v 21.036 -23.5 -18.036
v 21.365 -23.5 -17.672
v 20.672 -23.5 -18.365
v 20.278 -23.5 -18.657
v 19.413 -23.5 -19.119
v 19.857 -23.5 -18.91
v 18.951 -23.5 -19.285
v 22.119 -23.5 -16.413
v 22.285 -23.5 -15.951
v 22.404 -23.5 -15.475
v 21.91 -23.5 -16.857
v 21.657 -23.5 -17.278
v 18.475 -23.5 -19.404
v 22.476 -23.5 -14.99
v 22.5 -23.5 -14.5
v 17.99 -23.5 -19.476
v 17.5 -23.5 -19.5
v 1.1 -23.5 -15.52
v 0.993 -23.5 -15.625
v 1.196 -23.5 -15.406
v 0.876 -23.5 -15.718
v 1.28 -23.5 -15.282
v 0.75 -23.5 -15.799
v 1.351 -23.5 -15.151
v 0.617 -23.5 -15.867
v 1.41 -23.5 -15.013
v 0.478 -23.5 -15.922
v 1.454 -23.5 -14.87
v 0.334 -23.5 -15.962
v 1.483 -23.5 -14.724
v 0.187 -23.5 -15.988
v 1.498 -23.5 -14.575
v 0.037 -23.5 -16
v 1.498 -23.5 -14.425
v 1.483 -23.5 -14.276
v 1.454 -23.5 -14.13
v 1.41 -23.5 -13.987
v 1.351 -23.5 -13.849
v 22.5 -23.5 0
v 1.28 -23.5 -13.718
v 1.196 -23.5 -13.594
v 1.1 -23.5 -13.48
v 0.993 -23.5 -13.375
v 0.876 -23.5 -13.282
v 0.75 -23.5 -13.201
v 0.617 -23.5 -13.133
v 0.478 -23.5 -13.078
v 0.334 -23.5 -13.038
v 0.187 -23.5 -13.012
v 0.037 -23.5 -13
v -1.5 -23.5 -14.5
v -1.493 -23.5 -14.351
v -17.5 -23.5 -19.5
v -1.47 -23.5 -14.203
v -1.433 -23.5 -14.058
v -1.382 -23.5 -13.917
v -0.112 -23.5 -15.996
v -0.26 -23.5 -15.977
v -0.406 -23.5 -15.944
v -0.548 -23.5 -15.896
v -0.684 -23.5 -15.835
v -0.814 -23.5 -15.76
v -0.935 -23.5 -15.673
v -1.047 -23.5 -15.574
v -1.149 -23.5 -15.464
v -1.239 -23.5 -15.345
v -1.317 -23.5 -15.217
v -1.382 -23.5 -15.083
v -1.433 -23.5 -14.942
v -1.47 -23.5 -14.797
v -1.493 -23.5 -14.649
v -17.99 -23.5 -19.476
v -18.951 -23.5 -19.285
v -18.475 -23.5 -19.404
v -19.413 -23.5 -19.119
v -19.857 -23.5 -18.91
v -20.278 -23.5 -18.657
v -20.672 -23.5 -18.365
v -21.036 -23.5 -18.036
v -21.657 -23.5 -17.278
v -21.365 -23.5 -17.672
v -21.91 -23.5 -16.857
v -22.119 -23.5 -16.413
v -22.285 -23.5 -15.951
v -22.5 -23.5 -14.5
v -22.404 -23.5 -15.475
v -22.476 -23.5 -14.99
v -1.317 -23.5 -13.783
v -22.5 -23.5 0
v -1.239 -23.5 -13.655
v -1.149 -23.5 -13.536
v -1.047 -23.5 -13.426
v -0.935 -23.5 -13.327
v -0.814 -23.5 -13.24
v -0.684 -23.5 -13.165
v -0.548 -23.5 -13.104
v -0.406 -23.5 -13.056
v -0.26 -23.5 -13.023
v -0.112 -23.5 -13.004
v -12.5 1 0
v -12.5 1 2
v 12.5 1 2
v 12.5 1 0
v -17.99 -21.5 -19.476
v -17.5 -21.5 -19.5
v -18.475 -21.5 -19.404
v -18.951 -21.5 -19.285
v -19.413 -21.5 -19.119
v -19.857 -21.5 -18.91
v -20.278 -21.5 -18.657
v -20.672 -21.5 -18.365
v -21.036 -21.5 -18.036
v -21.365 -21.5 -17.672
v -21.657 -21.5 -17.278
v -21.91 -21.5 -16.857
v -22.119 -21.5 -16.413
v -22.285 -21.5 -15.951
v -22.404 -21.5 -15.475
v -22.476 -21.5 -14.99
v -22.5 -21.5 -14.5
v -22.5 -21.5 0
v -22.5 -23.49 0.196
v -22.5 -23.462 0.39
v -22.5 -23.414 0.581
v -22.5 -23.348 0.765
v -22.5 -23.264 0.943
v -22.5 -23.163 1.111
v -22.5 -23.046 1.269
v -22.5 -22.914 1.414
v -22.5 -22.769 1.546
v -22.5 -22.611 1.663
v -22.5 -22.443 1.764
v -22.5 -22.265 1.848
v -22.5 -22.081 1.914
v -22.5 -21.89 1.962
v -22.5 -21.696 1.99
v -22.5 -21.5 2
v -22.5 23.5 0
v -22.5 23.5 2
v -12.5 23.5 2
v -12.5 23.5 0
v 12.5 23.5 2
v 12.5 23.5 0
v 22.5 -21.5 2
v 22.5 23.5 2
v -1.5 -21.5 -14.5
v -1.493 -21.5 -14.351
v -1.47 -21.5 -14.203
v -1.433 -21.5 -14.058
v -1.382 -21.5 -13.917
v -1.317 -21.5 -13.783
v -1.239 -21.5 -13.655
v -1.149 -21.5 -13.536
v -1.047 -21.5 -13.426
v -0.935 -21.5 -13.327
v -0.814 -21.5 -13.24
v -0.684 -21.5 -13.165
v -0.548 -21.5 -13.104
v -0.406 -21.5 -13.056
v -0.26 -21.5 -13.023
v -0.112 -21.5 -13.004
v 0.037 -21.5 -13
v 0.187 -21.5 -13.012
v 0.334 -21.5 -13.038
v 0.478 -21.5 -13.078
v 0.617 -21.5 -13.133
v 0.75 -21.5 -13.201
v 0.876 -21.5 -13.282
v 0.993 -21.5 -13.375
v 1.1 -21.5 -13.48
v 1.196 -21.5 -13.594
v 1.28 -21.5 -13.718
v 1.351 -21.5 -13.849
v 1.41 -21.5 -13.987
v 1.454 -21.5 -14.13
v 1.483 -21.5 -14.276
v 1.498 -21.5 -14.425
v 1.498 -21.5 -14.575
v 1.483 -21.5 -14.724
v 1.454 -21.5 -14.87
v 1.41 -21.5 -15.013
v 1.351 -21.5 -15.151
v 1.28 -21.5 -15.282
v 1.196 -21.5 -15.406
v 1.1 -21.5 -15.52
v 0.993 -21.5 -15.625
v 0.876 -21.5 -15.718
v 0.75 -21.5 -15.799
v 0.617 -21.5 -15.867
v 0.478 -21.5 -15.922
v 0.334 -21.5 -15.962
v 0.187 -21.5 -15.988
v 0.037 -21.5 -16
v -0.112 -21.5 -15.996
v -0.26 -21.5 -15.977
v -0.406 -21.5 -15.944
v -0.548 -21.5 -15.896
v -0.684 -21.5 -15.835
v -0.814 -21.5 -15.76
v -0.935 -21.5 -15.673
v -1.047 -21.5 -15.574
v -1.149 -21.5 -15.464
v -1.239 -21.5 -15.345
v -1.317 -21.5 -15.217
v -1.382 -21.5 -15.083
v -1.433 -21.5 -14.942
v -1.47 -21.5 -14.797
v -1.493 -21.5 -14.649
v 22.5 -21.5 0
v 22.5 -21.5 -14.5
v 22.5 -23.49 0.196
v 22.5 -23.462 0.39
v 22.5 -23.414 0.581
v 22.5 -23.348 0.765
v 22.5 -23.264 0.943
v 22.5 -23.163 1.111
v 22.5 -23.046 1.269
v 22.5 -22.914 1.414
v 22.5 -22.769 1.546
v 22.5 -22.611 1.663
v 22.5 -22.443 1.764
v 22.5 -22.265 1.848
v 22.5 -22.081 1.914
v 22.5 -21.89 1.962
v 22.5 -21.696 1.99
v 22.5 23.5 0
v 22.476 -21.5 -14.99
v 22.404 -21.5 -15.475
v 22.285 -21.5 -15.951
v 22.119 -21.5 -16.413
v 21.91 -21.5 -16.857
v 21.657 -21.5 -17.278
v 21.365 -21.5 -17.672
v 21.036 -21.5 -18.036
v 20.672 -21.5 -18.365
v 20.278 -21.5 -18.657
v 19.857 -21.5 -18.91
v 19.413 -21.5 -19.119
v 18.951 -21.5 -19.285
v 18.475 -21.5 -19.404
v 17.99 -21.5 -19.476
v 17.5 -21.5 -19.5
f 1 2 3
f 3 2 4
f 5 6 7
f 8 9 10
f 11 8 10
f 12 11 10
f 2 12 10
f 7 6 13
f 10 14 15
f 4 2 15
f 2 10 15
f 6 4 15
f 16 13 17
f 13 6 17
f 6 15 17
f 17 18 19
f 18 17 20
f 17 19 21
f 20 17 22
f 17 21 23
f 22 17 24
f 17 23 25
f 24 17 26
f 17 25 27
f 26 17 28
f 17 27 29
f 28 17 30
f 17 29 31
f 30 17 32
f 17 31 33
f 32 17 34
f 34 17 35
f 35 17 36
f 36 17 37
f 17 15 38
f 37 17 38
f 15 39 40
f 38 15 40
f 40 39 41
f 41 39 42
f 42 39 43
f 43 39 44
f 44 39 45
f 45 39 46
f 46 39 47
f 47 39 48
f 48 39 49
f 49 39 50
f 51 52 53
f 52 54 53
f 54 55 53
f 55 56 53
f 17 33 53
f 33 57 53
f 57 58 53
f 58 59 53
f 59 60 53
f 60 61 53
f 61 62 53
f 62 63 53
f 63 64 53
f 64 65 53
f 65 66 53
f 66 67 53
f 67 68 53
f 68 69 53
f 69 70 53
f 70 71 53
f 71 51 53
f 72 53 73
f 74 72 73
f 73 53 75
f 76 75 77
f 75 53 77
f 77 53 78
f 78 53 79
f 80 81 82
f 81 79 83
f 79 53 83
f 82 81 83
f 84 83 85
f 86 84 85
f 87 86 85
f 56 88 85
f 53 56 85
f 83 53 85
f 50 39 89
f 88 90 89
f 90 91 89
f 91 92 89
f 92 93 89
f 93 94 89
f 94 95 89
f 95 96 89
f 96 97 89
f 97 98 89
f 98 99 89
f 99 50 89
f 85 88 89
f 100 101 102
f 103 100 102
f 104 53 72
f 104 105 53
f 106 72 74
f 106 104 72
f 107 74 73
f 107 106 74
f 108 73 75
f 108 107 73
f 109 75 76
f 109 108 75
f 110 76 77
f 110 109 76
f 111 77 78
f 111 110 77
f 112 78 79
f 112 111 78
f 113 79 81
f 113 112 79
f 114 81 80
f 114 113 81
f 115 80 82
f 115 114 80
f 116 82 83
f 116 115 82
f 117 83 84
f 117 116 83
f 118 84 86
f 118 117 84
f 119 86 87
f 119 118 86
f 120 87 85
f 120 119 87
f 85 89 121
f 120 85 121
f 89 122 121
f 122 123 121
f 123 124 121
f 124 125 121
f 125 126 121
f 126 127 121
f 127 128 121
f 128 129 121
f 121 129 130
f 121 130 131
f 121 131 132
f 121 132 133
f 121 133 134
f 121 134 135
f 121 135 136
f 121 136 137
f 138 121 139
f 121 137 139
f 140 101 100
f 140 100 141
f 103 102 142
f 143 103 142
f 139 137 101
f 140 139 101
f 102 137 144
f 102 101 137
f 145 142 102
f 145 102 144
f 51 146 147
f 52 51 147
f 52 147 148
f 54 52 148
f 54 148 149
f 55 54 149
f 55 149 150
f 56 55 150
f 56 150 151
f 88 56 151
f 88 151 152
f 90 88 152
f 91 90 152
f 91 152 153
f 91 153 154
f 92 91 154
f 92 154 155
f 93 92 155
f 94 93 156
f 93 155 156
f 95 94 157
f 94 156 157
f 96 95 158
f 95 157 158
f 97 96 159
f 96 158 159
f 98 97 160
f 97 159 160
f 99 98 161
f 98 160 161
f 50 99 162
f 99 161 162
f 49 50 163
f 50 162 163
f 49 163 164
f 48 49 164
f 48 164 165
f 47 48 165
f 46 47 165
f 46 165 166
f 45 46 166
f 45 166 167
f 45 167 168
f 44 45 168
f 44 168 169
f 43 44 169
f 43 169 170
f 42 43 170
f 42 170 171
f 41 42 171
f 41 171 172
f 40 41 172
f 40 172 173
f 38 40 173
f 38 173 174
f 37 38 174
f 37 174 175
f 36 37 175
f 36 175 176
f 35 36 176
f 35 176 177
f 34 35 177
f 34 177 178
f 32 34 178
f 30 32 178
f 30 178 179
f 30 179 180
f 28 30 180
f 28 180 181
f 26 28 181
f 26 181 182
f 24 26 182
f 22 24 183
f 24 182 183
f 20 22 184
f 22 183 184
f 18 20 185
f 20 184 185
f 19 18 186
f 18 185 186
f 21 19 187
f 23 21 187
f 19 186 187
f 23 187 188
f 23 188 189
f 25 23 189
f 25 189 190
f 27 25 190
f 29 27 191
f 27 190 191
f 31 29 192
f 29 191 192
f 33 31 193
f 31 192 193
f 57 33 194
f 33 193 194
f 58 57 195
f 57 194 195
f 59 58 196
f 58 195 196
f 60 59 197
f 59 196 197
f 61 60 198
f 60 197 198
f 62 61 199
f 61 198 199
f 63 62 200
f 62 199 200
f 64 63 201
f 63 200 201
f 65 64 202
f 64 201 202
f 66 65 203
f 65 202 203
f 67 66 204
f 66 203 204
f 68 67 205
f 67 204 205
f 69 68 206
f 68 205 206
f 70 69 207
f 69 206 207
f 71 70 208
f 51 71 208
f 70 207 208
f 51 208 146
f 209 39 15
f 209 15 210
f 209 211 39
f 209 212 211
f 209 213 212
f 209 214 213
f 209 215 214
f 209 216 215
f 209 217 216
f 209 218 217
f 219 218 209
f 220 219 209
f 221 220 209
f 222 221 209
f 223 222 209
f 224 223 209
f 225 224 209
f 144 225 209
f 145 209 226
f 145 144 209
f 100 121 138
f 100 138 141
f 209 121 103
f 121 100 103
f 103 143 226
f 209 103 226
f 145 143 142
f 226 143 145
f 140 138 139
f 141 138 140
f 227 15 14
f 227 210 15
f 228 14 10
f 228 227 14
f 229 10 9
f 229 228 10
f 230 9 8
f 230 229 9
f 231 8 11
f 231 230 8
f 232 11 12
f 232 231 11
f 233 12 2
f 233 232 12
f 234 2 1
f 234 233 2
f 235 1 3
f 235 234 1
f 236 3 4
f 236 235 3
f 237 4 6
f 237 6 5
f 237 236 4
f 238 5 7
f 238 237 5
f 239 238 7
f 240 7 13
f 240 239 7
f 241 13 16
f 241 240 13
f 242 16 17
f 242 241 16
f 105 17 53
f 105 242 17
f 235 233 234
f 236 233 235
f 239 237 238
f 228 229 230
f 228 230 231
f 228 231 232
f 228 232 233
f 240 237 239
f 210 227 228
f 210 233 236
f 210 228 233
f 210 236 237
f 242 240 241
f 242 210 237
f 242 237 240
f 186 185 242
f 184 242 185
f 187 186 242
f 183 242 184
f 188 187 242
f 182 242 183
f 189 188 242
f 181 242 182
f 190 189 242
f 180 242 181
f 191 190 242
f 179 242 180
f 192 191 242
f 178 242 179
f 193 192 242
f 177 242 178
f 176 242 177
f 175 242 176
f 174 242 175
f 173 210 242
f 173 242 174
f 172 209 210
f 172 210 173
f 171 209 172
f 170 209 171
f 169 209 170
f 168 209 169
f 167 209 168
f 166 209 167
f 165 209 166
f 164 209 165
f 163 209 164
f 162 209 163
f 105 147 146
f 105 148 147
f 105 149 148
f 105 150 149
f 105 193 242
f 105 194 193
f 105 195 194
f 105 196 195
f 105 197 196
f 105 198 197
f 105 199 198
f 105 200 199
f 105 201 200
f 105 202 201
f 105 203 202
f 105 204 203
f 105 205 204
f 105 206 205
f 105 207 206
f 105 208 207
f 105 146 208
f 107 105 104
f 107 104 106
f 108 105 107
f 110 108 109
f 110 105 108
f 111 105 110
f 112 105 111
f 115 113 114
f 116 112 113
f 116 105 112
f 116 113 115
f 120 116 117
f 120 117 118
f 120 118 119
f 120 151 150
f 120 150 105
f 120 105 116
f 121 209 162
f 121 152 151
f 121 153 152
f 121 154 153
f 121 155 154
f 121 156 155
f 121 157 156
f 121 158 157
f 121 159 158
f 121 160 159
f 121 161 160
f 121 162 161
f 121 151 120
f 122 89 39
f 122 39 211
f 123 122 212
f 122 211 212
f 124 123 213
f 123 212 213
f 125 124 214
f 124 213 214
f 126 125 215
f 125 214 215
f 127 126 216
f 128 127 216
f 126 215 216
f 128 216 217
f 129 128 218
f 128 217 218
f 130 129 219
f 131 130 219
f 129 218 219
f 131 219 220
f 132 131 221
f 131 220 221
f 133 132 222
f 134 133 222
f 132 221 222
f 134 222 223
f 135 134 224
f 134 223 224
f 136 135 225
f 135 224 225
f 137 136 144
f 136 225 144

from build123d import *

# Parameters (mm, degrees)
SKETCH1_W           = 45
SKETCH1_H           = 47
BOSS_EXTRUDE1_DEPTH = 2
SKETCH2_W           = 45
SKETCH2_H           = 2
BOSS_EXTRUDE2_DEPTH = 19.5
FILLET1_R           = 2
FILLET2_R           = 5
SKETCH3_W           = 25
SKETCH3_H           = 22.5
CUT_EXTRUDE1_DEPTH  = 39.99679474
SKETCH4_R           = 1.5
CUT_EXTRUDE2_DEPTH  = 54.958317246


with BuildPart() as part:
    # Sketch1 → Boss-Extrude1 (new body)
    with BuildSketch(Plane.XY):
        Rectangle(SKETCH1_W, SKETCH1_H)
    extrude(amount=BOSS_EXTRUDE1_DEPTH)

    # Sketch2 → Boss-Extrude2 (add)
    with BuildSketch(Plane(origin=(0, 0, 0), x_dir=(-1, 0, 0), z_dir=(0, 0, -1))):
        with Locations((0, -22.5)):
            Rectangle(SKETCH2_W, SKETCH2_H)
    extrude(amount=BOSS_EXTRUDE2_DEPTH)

    # Fillet1
    fillet1_edges = [part.edges().sort_by_distance(p)[0] for p in [
        (0, -23.5, 2),
    ]]
    fillet(fillet1_edges, radius=FILLET1_R)

    # Fillet2
    fillet2_edges = [part.edges().sort_by_distance(p)[0] for p in [
        (22.5, -22.5, -19.5),
        (-22.5, -22.5, -19.5),
    ]]
    fillet(fillet2_edges, radius=FILLET2_R)

    # Sketch3 → Cut-Extrude1 (cut, through all)
    with BuildSketch(Plane.XY.offset(2)):
        with Locations((0, 12.25)):
            Rectangle(SKETCH3_W, SKETCH3_H)
    extrude(amount=-CUT_EXTRUDE1_DEPTH, mode=Mode.SUBTRACT)

    # Sketch4 → Cut-Extrude2 (cut, through all)
    with BuildSketch(Plane(origin=(0, -21.5, 0), x_dir=(1, 0, 0), z_dir=(0, 1, 0))):
        with Locations(Location((0, 14.5, 0), (0, 0, 180))):
            Circle(SKETCH4_R)
    extrude(amount=-CUT_EXTRUDE2_DEPTH, mode=Mode.SUBTRACT)


solid = part.part
